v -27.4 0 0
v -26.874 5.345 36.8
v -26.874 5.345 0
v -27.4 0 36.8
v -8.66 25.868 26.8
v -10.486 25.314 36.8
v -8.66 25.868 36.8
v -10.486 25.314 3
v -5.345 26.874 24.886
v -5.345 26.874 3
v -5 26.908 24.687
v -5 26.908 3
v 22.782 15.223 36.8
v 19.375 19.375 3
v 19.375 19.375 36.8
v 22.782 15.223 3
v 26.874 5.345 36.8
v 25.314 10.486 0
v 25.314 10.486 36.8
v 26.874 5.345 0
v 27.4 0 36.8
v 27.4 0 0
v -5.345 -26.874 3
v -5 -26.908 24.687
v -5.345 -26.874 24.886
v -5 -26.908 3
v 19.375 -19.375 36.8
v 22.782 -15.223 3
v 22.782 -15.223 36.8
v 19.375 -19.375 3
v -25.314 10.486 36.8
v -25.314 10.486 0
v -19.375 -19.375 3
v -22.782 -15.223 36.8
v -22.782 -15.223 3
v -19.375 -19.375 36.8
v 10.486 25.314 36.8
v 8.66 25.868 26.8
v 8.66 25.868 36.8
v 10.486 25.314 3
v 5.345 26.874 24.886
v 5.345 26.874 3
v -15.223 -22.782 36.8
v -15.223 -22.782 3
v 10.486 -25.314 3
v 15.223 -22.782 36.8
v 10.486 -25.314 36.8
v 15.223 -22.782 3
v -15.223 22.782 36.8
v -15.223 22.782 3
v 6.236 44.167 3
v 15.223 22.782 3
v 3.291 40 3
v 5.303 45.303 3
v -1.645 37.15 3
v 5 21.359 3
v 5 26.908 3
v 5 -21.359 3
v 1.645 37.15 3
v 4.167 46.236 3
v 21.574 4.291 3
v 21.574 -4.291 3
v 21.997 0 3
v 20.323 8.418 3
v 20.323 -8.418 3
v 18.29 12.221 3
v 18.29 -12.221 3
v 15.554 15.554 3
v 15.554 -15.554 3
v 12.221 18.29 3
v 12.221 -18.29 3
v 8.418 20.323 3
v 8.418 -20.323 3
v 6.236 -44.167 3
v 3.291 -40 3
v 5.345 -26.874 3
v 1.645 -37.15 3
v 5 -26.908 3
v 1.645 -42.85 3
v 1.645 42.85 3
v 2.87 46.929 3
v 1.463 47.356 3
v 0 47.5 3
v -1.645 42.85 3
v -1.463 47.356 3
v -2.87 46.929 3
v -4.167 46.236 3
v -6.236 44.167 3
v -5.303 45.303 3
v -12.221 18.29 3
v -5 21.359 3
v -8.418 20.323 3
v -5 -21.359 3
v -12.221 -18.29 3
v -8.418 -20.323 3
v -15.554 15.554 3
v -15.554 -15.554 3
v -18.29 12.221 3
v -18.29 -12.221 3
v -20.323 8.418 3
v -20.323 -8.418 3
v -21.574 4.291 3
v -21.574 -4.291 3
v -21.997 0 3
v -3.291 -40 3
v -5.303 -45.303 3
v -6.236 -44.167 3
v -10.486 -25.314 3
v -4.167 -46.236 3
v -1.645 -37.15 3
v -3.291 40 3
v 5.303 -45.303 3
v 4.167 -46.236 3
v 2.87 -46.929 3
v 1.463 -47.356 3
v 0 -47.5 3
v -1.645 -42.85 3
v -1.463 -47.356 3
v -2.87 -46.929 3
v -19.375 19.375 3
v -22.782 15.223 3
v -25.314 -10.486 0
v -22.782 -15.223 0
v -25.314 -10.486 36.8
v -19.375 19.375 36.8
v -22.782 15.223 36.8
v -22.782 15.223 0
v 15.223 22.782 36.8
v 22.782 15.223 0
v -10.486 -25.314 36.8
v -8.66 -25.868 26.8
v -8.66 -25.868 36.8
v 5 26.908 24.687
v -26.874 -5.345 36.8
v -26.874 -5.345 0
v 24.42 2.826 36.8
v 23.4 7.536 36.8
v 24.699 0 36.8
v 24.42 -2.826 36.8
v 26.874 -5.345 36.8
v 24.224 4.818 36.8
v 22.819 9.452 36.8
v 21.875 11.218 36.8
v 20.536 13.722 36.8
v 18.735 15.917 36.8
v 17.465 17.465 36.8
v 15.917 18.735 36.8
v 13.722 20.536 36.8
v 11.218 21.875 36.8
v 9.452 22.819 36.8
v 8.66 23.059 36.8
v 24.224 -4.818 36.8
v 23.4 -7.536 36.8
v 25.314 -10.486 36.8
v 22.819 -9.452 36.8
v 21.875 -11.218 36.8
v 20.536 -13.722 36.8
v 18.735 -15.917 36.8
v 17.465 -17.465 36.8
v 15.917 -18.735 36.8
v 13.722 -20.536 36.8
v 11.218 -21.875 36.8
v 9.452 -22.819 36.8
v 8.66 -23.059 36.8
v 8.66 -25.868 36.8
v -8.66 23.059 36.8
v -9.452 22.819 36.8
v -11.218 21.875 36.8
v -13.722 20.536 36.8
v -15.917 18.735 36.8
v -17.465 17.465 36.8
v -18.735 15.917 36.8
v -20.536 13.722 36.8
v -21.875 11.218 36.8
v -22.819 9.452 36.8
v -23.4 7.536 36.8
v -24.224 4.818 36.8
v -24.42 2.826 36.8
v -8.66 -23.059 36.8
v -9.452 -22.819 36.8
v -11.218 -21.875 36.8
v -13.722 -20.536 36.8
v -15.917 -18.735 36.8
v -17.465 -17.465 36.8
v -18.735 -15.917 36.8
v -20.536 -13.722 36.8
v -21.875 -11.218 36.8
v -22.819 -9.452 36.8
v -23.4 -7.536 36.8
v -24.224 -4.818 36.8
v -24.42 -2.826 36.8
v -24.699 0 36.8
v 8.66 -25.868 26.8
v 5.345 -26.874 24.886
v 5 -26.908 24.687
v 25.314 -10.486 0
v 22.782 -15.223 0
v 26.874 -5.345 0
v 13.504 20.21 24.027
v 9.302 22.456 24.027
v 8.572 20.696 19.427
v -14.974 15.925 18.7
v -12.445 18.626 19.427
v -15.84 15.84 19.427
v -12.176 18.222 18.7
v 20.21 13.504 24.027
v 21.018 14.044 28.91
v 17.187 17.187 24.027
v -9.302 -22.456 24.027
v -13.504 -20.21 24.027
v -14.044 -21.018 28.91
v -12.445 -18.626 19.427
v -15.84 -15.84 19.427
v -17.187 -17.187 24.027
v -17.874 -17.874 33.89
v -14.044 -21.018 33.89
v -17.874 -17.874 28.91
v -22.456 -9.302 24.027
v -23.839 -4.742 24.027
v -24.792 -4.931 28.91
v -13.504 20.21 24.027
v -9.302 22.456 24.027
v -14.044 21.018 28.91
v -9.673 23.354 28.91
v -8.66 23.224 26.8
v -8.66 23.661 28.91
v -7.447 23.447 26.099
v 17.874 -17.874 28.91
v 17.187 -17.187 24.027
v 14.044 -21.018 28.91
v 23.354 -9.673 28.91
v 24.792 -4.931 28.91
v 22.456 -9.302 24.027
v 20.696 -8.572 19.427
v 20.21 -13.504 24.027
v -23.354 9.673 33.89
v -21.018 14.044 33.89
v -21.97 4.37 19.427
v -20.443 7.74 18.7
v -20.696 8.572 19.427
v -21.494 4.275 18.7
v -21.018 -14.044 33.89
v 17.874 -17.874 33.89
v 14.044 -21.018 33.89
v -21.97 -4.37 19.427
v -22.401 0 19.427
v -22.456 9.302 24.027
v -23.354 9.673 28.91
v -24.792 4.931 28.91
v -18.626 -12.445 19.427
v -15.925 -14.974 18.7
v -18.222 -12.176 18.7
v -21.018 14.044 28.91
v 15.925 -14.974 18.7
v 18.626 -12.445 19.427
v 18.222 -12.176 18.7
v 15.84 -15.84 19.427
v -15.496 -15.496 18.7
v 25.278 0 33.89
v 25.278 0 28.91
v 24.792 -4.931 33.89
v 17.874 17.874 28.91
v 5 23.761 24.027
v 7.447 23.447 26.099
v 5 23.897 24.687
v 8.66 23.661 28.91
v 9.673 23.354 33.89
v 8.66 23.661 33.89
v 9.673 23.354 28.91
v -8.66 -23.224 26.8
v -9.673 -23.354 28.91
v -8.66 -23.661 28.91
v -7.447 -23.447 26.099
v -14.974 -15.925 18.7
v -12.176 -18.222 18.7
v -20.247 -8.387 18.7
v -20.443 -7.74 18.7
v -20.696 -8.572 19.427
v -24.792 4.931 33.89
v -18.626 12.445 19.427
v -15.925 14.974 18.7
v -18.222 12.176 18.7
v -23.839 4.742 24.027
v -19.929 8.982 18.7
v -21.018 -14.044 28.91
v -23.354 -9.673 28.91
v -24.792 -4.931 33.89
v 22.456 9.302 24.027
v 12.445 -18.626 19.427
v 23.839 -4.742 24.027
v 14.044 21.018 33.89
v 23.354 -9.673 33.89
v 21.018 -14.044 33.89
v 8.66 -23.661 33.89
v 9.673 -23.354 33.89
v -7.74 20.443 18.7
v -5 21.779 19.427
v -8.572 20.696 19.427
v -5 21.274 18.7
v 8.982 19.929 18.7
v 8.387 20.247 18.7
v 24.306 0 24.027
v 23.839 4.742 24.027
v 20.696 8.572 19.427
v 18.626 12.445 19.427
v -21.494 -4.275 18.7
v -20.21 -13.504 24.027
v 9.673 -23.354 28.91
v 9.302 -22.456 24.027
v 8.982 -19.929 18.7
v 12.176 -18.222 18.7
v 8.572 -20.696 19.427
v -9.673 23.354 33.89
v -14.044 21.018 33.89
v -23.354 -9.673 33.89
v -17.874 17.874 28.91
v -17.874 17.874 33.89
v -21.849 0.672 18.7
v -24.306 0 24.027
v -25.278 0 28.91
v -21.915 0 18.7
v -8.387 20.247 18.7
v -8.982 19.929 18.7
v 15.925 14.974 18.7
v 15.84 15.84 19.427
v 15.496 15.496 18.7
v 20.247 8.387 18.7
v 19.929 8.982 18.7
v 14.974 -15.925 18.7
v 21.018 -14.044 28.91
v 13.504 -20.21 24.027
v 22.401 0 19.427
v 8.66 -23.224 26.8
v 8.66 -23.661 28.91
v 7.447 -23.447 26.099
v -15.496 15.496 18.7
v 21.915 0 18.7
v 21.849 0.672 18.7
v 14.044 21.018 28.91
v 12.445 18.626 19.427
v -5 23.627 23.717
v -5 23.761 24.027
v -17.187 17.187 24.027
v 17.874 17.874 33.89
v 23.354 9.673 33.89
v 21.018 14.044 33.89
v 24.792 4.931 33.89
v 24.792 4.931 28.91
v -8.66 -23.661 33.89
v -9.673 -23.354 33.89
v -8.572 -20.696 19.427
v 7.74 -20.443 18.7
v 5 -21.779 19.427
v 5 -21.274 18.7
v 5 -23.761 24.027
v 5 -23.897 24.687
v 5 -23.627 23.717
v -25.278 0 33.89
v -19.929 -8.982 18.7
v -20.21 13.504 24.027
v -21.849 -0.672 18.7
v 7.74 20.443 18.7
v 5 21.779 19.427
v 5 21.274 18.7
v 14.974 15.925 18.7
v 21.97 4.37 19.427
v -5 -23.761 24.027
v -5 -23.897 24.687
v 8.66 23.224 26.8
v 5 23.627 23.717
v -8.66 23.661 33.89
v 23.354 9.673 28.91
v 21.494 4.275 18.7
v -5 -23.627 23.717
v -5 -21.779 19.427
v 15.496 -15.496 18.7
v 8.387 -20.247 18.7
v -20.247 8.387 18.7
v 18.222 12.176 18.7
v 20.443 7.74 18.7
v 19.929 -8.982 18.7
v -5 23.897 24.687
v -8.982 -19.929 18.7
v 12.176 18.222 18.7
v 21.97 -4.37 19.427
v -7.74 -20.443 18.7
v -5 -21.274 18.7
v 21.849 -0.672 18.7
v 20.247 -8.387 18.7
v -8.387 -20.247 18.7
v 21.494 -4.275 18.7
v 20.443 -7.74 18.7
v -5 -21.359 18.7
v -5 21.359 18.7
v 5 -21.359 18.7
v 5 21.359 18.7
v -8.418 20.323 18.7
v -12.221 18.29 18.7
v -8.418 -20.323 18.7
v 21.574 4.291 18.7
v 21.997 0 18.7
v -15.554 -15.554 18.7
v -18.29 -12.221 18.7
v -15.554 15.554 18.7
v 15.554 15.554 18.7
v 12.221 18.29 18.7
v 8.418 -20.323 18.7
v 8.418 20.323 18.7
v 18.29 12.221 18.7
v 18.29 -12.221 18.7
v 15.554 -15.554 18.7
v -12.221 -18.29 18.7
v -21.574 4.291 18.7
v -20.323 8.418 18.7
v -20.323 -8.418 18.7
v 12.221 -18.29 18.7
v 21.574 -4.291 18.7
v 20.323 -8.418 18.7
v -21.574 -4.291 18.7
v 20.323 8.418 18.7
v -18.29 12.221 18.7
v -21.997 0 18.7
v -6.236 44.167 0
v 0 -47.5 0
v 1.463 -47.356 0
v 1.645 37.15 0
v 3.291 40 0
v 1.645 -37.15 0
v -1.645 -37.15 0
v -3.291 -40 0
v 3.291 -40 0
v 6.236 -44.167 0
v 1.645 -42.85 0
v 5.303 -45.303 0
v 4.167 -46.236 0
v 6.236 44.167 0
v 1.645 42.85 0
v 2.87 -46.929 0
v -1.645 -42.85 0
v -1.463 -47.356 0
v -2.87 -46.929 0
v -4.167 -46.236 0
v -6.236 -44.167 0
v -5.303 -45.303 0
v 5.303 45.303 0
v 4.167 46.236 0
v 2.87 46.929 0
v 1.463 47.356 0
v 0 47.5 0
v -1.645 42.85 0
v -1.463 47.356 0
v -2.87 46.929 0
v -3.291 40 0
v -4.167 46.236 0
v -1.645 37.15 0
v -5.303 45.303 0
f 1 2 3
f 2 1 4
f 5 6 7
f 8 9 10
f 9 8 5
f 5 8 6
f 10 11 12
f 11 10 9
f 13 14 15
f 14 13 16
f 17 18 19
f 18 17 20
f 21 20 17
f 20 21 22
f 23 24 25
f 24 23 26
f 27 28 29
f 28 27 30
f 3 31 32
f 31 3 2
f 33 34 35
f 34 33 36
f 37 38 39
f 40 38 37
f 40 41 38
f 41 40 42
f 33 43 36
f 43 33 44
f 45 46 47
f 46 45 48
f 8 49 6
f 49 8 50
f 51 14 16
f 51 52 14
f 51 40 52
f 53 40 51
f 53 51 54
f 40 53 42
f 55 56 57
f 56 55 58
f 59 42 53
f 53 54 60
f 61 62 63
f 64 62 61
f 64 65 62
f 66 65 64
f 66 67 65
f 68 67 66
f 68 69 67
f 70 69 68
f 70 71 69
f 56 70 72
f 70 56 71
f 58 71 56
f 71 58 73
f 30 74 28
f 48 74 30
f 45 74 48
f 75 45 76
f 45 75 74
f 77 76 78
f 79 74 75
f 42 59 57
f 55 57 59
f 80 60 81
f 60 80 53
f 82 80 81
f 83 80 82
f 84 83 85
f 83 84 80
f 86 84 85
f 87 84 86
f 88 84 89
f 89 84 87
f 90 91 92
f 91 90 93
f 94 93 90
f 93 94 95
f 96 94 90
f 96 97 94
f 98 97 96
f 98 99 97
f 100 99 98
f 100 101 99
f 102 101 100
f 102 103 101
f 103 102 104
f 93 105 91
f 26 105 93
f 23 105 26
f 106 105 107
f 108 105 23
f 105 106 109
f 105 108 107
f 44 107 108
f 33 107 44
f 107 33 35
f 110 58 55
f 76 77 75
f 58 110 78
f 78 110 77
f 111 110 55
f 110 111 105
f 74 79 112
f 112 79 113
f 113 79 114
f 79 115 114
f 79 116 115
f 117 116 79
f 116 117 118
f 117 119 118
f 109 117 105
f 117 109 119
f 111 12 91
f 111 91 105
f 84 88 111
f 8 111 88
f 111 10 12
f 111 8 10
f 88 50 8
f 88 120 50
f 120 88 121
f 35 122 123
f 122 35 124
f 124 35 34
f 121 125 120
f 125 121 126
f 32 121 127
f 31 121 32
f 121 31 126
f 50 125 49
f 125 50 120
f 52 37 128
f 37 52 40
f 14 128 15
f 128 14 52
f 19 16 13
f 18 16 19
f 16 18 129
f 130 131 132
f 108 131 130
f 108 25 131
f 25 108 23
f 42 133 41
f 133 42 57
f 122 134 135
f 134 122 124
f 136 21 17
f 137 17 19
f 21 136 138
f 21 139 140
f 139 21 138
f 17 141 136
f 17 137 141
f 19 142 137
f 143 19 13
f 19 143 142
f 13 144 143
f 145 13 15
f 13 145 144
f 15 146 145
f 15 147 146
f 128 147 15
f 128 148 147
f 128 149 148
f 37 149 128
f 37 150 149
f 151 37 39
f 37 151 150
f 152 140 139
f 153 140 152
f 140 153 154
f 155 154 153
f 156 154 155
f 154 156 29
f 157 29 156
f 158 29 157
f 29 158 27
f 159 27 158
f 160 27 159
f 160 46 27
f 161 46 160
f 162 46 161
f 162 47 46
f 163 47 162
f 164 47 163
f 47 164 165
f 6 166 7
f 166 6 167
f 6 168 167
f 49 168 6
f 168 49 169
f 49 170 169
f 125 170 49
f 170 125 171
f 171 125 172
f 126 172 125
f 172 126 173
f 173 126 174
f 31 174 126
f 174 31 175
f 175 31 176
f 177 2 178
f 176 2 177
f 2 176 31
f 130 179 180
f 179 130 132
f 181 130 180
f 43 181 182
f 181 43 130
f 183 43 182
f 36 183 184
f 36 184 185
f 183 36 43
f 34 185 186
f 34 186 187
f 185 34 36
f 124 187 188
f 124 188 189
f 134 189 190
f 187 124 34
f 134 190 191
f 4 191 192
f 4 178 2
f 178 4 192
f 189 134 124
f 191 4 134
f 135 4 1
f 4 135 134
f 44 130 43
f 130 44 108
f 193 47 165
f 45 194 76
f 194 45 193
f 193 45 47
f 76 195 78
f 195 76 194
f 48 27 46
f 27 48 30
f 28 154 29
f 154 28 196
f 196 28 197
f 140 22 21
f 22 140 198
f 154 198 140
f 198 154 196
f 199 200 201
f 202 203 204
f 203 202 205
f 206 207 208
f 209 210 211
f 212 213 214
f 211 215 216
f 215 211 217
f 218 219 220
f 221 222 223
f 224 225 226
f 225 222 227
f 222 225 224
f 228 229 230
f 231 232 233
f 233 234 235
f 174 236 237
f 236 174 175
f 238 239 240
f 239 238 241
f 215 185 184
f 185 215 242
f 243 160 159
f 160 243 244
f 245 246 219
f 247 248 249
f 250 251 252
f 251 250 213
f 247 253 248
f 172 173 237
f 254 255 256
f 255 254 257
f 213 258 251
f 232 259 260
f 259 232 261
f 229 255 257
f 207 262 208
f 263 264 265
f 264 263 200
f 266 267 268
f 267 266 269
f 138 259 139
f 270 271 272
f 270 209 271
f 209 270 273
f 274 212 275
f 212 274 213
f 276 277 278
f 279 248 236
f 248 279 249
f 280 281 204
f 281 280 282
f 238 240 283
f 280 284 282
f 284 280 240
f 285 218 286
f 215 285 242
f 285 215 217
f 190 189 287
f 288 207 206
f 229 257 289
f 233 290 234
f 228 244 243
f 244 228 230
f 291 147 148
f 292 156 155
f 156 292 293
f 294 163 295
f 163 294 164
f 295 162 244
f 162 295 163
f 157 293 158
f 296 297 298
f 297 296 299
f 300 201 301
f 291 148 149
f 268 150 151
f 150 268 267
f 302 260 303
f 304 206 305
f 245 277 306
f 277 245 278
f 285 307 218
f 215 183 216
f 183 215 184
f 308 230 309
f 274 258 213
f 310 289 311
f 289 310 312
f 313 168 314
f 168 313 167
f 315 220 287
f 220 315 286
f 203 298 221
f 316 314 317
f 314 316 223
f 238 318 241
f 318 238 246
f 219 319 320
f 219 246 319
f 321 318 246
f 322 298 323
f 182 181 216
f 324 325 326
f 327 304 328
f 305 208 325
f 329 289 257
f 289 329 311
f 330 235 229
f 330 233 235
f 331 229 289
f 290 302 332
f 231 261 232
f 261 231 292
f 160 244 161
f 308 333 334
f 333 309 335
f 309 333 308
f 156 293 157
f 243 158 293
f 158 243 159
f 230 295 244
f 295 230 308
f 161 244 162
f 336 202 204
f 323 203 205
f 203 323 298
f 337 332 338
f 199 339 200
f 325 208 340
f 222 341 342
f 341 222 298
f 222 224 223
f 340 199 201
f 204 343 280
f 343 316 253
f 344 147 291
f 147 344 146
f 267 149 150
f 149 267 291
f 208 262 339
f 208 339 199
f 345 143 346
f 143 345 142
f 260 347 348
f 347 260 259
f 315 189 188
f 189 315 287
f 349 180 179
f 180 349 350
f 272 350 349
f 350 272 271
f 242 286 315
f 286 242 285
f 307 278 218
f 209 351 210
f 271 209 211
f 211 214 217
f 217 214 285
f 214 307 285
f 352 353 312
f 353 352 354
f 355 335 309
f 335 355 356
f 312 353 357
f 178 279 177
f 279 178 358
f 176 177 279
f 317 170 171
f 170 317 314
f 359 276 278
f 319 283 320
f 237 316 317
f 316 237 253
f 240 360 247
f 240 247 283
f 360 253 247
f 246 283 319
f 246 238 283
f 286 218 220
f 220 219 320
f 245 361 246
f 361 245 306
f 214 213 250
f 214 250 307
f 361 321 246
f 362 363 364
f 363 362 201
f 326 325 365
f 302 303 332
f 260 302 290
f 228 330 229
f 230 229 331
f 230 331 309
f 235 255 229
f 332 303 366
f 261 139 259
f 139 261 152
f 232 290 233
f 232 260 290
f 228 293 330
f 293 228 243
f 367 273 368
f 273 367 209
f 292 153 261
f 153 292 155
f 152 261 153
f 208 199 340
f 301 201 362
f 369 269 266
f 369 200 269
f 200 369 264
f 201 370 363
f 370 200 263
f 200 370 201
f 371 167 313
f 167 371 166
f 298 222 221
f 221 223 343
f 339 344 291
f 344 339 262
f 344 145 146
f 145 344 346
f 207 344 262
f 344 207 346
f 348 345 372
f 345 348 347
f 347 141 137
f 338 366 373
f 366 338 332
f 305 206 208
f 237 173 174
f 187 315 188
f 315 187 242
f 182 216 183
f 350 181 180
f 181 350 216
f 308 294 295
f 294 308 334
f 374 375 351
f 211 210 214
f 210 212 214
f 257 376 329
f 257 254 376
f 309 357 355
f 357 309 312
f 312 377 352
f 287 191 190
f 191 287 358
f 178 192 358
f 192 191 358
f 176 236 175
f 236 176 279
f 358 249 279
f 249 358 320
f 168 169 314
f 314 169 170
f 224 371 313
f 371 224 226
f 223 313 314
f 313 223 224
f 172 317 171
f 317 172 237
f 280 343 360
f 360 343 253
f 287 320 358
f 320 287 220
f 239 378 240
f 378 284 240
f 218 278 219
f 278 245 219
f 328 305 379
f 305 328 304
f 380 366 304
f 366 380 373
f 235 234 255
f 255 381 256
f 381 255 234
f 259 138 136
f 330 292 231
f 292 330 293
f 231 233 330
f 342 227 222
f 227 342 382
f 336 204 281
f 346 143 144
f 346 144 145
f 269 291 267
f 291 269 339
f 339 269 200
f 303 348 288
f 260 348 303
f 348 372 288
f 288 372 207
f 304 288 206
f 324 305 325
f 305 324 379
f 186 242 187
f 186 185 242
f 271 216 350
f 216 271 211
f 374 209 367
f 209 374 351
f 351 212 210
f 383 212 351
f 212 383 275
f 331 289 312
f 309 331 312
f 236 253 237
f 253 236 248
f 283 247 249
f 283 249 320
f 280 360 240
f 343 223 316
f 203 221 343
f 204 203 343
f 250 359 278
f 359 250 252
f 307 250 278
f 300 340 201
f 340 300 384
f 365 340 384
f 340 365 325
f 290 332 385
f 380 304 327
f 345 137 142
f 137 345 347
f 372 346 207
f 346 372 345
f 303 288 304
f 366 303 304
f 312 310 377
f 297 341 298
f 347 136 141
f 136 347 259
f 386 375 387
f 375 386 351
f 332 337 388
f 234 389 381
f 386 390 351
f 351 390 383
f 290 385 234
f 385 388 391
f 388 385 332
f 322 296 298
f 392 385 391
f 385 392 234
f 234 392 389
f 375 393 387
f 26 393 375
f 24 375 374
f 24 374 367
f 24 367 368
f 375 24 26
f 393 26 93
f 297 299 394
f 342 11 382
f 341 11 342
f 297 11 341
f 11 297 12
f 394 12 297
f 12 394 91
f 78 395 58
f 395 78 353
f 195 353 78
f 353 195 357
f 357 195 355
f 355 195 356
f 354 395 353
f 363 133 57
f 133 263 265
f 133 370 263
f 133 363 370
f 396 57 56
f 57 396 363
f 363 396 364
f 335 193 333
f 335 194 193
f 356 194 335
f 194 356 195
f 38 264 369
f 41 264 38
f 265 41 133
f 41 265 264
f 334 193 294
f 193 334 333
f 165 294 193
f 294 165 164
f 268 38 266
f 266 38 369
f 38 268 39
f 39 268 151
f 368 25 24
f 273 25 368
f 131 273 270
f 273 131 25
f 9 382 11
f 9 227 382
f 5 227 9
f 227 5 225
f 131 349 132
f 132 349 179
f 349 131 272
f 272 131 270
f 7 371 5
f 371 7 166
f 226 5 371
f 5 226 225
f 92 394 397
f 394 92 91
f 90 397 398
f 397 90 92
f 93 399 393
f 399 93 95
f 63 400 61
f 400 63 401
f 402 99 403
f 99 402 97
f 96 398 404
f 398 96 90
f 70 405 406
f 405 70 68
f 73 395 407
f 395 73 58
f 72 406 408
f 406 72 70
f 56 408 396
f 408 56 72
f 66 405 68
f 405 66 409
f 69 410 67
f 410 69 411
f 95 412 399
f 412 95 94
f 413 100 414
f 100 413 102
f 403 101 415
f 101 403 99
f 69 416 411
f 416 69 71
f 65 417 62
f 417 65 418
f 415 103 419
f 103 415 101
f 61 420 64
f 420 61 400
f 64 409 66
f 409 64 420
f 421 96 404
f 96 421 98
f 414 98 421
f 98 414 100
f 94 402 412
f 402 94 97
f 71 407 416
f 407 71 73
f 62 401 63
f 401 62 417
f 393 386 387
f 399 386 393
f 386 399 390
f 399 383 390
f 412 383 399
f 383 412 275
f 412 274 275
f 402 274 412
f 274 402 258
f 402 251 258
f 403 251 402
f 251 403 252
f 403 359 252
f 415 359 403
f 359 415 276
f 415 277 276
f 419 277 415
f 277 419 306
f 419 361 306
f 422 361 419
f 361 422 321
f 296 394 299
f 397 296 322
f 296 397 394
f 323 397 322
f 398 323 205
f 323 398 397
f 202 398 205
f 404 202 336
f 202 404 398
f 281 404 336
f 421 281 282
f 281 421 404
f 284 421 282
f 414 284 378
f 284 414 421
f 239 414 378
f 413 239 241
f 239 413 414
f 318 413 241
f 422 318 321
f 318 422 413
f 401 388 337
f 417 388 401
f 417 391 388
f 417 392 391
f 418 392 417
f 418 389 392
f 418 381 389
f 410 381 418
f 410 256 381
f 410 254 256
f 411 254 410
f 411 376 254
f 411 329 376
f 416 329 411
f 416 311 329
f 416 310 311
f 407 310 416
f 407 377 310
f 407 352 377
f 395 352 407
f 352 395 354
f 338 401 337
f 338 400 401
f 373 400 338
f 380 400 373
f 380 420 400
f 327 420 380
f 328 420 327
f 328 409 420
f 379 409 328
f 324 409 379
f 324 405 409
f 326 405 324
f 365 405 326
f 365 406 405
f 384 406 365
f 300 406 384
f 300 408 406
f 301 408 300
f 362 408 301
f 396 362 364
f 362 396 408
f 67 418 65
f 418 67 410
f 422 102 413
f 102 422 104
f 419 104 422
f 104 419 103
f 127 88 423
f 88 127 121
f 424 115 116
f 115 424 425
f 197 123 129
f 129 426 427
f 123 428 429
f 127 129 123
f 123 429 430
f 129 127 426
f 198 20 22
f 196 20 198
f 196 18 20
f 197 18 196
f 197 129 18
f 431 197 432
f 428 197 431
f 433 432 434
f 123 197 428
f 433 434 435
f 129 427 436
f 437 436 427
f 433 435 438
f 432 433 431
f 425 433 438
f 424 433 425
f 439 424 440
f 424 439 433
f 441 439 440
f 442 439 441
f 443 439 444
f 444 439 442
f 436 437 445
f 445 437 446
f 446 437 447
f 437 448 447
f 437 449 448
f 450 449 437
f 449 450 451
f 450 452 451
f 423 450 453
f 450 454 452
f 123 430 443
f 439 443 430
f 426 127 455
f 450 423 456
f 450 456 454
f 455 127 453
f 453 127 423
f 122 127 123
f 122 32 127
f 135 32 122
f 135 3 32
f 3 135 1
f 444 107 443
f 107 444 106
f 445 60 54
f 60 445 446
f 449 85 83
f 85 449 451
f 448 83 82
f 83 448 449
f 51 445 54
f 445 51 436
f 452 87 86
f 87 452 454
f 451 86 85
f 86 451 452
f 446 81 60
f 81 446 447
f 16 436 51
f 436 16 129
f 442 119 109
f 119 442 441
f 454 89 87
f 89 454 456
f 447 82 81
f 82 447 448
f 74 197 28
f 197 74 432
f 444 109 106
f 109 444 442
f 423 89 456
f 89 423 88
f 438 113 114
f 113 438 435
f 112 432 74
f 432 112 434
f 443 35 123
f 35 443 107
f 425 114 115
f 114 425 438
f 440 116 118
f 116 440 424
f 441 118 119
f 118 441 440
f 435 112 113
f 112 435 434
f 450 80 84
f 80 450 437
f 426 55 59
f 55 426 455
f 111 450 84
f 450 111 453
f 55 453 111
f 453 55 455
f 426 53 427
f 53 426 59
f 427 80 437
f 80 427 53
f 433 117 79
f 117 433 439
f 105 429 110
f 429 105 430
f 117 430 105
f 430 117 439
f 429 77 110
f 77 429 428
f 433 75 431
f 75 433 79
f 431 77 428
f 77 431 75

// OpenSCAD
// file: oem/generic/standoffs.scad
include <lib.scad>;

use <third_party/threads.scad>;

function pvMetricHexStandoffDatasheet(length, width, hole_diameter=0, thread_pitch=0) =
     assert(length > 0)
     assert(width > 0)
     assert(hole_diameter >= 0)
     assert(width > hole_diameter)
     assert(thread_pitch >= 0)
     [["length", length], ["width", width], ["hole_diameter", hole_diameter], ["thread_pitch", thread_pitch]];


module pmMetricHexStandoff(datasheet) {
     width = property(datasheet, "width");
     length = property(datasheet, "length");
     hole_diameter = property(datasheet, "hole_diameter");
     thread_pitch = property(datasheet, "thread_pitch");
     difference() {
          cylinder(d=width / cos(30), h=length, $fn=6);
          translate([0, 0, -length/2]) {
               if (hole_diameter > 0) {
                    if (thread_pitch > 0) {
                         metric_thread(diameter=hole_diameter, pitch=thread_pitch,
                                       length=2 * length, internal=true);
                    } else {
                         cylinder(d=hole_diameter, h=2 * length);
                    }
               }
          }
     }
}

pmMetricHexStandoff(
     datasheet=pvMetricHexStandoffDatasheet(
          length=20, width=5, hole_diameter=3, thread_pitch=1
     )
);
// file: oem/generic/lib.scad
$fn = 32;

kEpsilon = 1e-1;

function property(table, key) = table[search([key], table)[0]][1];

module sector(radius, angles, fn = $fn) {
     r = radius / cos(180 / fn);
     step = -360 / fn;

     points = concat([[0, 0]],
                     [for(a = [angles[0] : step : angles[1] - 360])
                               [r * cos(a), r * sin(a)]
                          ],
                     [[r * cos(angles[1]), r * sin(angles[1])]]
          );

     difference() {
          circle(radius, $fn = fn);
          polygon(points);
     }
}

module ring(inner_radius, outer_radius, angles = [0, 360], fn = $fn) {
     difference() {
          sector(radius=outer_radius, angles=angles, fn=fn);
          sector(radius=inner_radius, angles=angles+[-kEpsilon, kEpsilon], fn=fn);
     }
}

module rounded_ring(inner_radius, outer_radius, angles = [0, 360], fn = $fn) {
     step_angle = 360 / fn;
     ring_width = outer_radius - inner_radius;
     ring_mean_radius = (outer_radius + inner_radius) / 2;
     for (theta = angles) {
          theta_d = theta / step_angle;
          theta_frac = (theta_d - floor(theta_d) - 0.5) * step_angle;
          rho = ring_mean_radius * cos(step_angle/2) / cos(theta_frac);
          rotate(theta)
          translate([rho, 0])
          circle(d=ring_width);
     }
     ring(inner_radius=inner_radius,
          outer_radius=outer_radius,
          angles=angles, fn=fn);
}

module fillet(r) {
     difference() {
          difference() {
               offset(r=-r - kEpsilon)
                    offset(delta=r) {
                    children();
               }
               offset(r=r)
                    offset(delta=-r) {
                    children();
               }
          }
          children();
     }
     offset(r=r)
          offset(delta=-r) {
          children();
     }
}

module bench_fillet(r, order=1000) {
     difference() {
          fillet(r) {
               translate([-order/2-kEpsilon, 0]) {
                    square([order, order], center=true);
               }
               children();
          }
          translate([-order/2-kEpsilon, 0]) {
               square([order+kEpsilon, order+kEpsilon], center=true);
          }
     }
}

module curved_bench_fillet(r, bench_radius, order=1000, internal=true) {
     difference() {
          fillet(r) {
               if (internal) {
                    translate([bench_radius, 0]) {
                         ring(inner_radius=bench_radius + kEpsilon, outer_radius=bench_radius * order);
                    }
               } else {
                    translate([-bench_radius, 0]) circle(r=bench_radius - kEpsilon);
               }
               children();
          }
          if (internal) {
               translate([bench_radius, 0]) {
                    ring(inner_radius=bench_radius,
                         outer_radius=bench_radius * order - kEpsilon);
               }
          } else {
               translate([-bench_radius, 0]) circle(r=bench_radius);
          }

     }
}


module window(side, position=[0, 0, 0], order=1000) {
    difference() {
        children();
        translate(position)  {
            difference() {
                square(order, center=true);
                square(side, center=true);
            }
        }
    }
}


module rounded_cylinder(diameter, height, fillet_radius, center) {
     translate([0, 0, ! center ? height/2 : 0]) {
          minkowski() {
               cylinder(d=(diameter - 2 * fillet_radius),
                        h=(height - 2 * fillet_radius),
                        center=true);
               sphere(r=fillet_radius);
          }
     }
}


module curved_support_xsection(support_radius, fillet_radius,
                               wall_inner_radius, wall_outer_radius,
                               hole_radius = 0, internal=true) {
     support_angular_width = (4 * support_radius / wall_outer_radius) * 180 / PI;
     wall_thickness = wall_outer_radius - wall_inner_radius;
     rotate([0, 0, internal ? 180 : 0]) {
          difference() {
               window(6*support_radius) {
                    curved_bench_fillet(fillet_radius, bench_radius=wall_inner_radius, internal=internal) {
                         hull() {
                              translate([support_radius + wall_thickness/2, 0]) {
                                   circle(r=support_radius);
                              }
                              rotate([0, 0, ! internal ? 180 : 0])
                              translate([wall_inner_radius + wall_thickness/2, 0]) {
                                   ring(inner_radius=wall_inner_radius,
                                        outer_radius=wall_outer_radius,
                                        angles=[180 - support_angular_width/2,
                                                180 + support_angular_width/2]);
                              }
                         }
                         rotate([0, 0, ! internal ? 180 : 0])
                         translate([wall_inner_radius + wall_thickness/2, 0]) {
                              ring(inner_radius=wall_inner_radius,
                                   outer_radius=wall_outer_radius,
                                   angles=[180 - support_angular_width,
                                           180 + support_angular_width]);
                         }
                    }
               }
               if (hole_radius > 0) {
                    translate([support_radius + wall_thickness/2, 0]) {
                         circle(r=hole_radius);
                    }
               }
          }
     }
}

module fill(upto=1000) {
     offset(delta=-upto) {
          offset(delta=upto) {
               children();
          }
     }
}

module outline(delta) {
     if (delta > 0) {
          difference() {
               offset(delta=delta) {
                    children();
               }
               children();
          }
     } else {
          difference() {
               children();
               offset(delta=delta) {
                    children();
               }
          }
     }
}

module duplicate(v) {
     children();
     mirror(v) children();
}

function steps(start, end, n) = [start:(end - start)/(n - 1):end];

function sigmoid(x) = 1.0 / (1.0 + exp(-x));

module sigmoid_profile(length, width, order=10, fn = $fn) {
     step = length / fn;
     points = concat(
          [[0, 0]],
          [for (x = [step:step:length-step]) [x, width * sigmoid(2 * order * ((x / length) - 0.5))]],
          [[length, width], [0, width]]

     );
     polygon(points=points);
}

module exp_nerve_xsection(height, length, decay_rate = 5, fn = $fn) {
     step = length / fn;
     points = concat(
          [[0, 0]],
          [for (x = [0:step:length-step]) [x, height * exp(-x/decay_rate)]],
          [[length, 0]]
          );
     polygon(points=points);
}

module exp_nerve(height, length, thickness, decay_rate = 3, fn = $fn) {
     rotate([90, 0, 0])
     linear_extrude(height=thickness, center=true) {
          exp_nerve_xsection(height, length, decay_rate, fn);
     }
}

module exp_corner_nerve(height, radius, angles, corner_radius = 0, decay_rate = 3, fn = $fn) {
     difference() {
          rotate_extrude() {
               if (corner_radius > 0) {
                    translate([corner_radius, 0, 0])
                    exp_nerve_xsection(height=height, length=radius, decay_rate=decay_rate, fn=fn);
               } else {
                    translate([-corner_radius, 0, 0])
                    mirror([1, 0, 0])
                    exp_nerve_xsection(height=height, length=radius, decay_rate=decay_rate, fn=fn);
               }
          }
          linear_extrude(height=2 * height, center=true) {
               sector(radius=radius + abs(corner_radius), angles=[angles[1], angles[0] + 360], fn=fn);
          }
     }
}
// file: generic/ball_caster_yoke.scad
include <lib.scad>;

function pvBallCasterYokeDatasheet(main_diameter, base_thickness, mount_offset, mount_diameter, mount_height=0) =
     assert(main_diameter > 0)
     assert(base_thickness > 0)
     assert(mount_offset > 0)
     assert(mount_diameter > 0)
     [["main_diameter", main_diameter], ["base_thickness", base_thickness],
      ["mount_offset", mount_offset], ["mount_diameter", mount_diameter],
      ["mount_height", mount_height]];

module pmBallCasterYoke(datasheet) {
     main_diameter = property(datasheet, "main_diameter");
     base_thickness = property(datasheet, "base_thickness");
     mount_offset = property(datasheet, "mount_offset");
     mount_diameter = property(datasheet, "mount_diameter");
     mount_height = property(datasheet, "mount_height");

     linear_extrude(height=base_thickness) {
          hull() {
               circle(d=main_diameter);
               duplicate([0, 1, 0]) {
                    translate([0, mount_offset, 0]) {
                         circle(d=mount_diameter);
                    }
               }
          }
     }
     if (mount_height > 0) {
          translate([0, 0, base_thickness]) {
               duplicate([0, 1, 0]) {
                    translate([0, mount_offset, 0]) {
                         cylinder(h=mount_height, d=mount_diameter);
                    }
               }
          }
     }
}

pmBallCasterYoke(
     datasheet=pvBallCasterYokeDatasheet(
          main_diameter=12, base_thickness=2, mount_offset=10, mount_diameter=4, mount_height=5
     )
);
// file: oem/m3_hex_standoff.scad
include <generic/lib.scad>;

use <generic/standoffs.scad>;

function vM3x30mmHexThreadedStandoffDatasheet() =
     pvMetricHexStandoffDatasheet(hole_diameter=3, thread_pitch=0.5, length=30, width=5.5);

module mM3x30mmHexThreadedStandoff() {
     pmMetricHexStandoff(datasheet=vM3x30mmHexThreadedStandoffDatasheet());
}

function vM3x30mmHexStandoffDatasheet() =
     pvMetricHexStandoffDatasheet(hole_diameter=3, length=30, width=5.5);

module mM3x30mmHexStandoff() {
     pmMetricHexStandoff(datasheet=vM3x30mmHexStandoffDatasheet());
}


function vM3x40mmHexThreadedStandoffDatasheet() =
     pvMetricHexStandoffDatasheet(hole_diameter=3, thread_pitch=0.5, length=40, width=5.5);

module mM3x40mmHexThreadedStandoff() {
     pmMetricHexStandoff(datasheet=vM3x40mmHexThreadedStandoffDatasheet());
}

function vM3x40mmHexStandoffDatasheet() =
     pvMetricHexStandoffDatasheet(hole_diameter=3, length=40, width=5.5);

module mM3x40mmHexStandoff() {
     pmMetricHexStandoff(datasheet=vM3x40mmHexStandoffDatasheet());
}


function vM3x15mmHexThreadedStandoffDatasheet() =
     pvMetricHexStandoffDatasheet(hole_diameter=3, thread_pitch=0.5, length=15, width=5.5);

module mM3x15mmHexThreadedStandoff() {
     pmMetricHexStandoff(datasheet=vM3x15mmHexThreadedStandoffDatasheet());
}

function vM3x15mmHexStandoffDatasheet() =
     pvMetricHexStandoffDatasheet(hole_diameter=3, length=15, width=5.5);

module mM3x15mmHexStandoff() {
     pmMetricHexStandoff(datasheet=vM3x15mmHexStandoffDatasheet());
}
// file: generic/ball_caster_support.scad
include <lib.scad>;

use <ball_caster_yoke.scad>;

function pvBallCasterSupportDatasheet(ball_diameter, ball_protrusion, ball_gap,
                                      wall_gap, wall_thickness, base_thickness,
                                      mount_offset, mount_diameter) =
     assert(ball_diameter > 0)
     assert(ball_protrusion > 0)
     assert(ball_diameter > ball_protrusion)
     assert(ball_gap > 0)
     assert(wall_gap > 0)
     assert(ball_diameter > 2 * wall_gap)
     assert(wall_thickness > 0)
     assert(base_thickness > 0)
     assert(mount_offset > ball_diameter/2)
     assert(mount_diameter > 0)
     [["ball_diameter", ball_diameter], ["ball_protrusion", ball_protrusion], ["ball_gap", ball_gap],
      ["wall_gap", wall_gap], ["wall_thickness", wall_thickness], ["base_thickness", base_thickness],
      ["mount_offset", mount_offset], ["mount_diameter", mount_diameter],
      ["ball_z_offset", base_thickness + ball_gap + ball_diameter / 2],
      ["main_height", base_thickness + ball_gap + ball_diameter - ball_protrusion],
      ["main_diameter", ball_diameter + 2 * wall_thickness]];

module pmBallCasterSupport(datasheet) {
     base_thickness = property(datasheet, "base_thickness");
     main_height = property(datasheet, "main_height");
     main_diameter = property(datasheet, "main_diameter");
     mount_offset = property(datasheet, "mount_offset");
     mount_diameter = property(datasheet, "mount_diameter");
     ball_diameter = property(datasheet, "ball_diameter");
     ball_protrusion = property(datasheet, "ball_protrusion");
     ball_gap = property(datasheet, "ball_gap");
     ball_z_offset = property(datasheet, "ball_z_offset");
     wall_gap = property(datasheet, "wall_gap");
     wall_thickness = property(datasheet, "wall_thickness");

     pmBallCasterYoke(datasheet);
     rotate([0, 0, 90]) {
          translate([0, 0, base_thickness]) {
               difference() {
                    cylinder(h=main_height - base_thickness, d=main_diameter);
                    translate([0, 0, ball_z_offset - base_thickness]) sphere(d=ball_diameter);
                    translate([-main_diameter / 2 - kEpsilon, -wall_gap / 2, 0]) {
                         cube([main_diameter + 2 * kEpsilon, wall_gap, main_height - base_thickness + kEpsilon]);
                    }
                    translate([-main_diameter/2 - kEpsilon, 0, main_height - base_thickness - wall_gap/2]) {
                         rotate([0, 90, 0]) cylinder(h=main_diameter + 2 * kEpsilon, d=2 * wall_gap, $fn=6);
                    }
                    cylinder(h=ball_diameter/4 + ball_gap, d=ball_diameter * sqrt(3)/2);
               }
          }
     }
}

pmBallCasterSupport(
     datasheet=pvBallCasterSupportDatasheet(
          ball_diameter=10, ball_protrusion=3, ball_gap=2,
          wall_gap=3, wall_thickness=2, base_thickness=2,
          mount_offset=10, mount_diameter=4
     )
);
// main file
include <generic/lib.scad>;

use <generic/ball_caster_support.scad>;

use <oem/m3_hex_standoff.scad>;

function v50mmBallCasterSupportDatasheet() =
     pvBallCasterSupportDatasheet(ball_diameter=50.8, ball_protrusion=20, ball_gap=3,
                                  wall_gap=10, wall_thickness=2, base_thickness=3,
                                  mount_offset=40, mount_diameter=15);

module m50mmBallCasterSupport() {
     datasheet = v50mmBallCasterSupportDatasheet();
     base_thickness = property(datasheet, "base_thickness");
     mount_offset = property(datasheet, "mount_offset");
     difference() {
          pmBallCasterSupport(datasheet);
          translate([0, 0, -kEpsilon]) {
               duplicate([0, 1, 0]) {
                    translate([0, mount_offset, 0]) {
                         linear_extrude(height=base_thickness + 2 * kEpsilon) {
                              offset(delta=kEpsilon) {
                                   hull() projection() mM3x40mmHexStandoff();
                              }
                         }
                    }
               }
          }
     }
}

m50mmBallCasterSupport();
